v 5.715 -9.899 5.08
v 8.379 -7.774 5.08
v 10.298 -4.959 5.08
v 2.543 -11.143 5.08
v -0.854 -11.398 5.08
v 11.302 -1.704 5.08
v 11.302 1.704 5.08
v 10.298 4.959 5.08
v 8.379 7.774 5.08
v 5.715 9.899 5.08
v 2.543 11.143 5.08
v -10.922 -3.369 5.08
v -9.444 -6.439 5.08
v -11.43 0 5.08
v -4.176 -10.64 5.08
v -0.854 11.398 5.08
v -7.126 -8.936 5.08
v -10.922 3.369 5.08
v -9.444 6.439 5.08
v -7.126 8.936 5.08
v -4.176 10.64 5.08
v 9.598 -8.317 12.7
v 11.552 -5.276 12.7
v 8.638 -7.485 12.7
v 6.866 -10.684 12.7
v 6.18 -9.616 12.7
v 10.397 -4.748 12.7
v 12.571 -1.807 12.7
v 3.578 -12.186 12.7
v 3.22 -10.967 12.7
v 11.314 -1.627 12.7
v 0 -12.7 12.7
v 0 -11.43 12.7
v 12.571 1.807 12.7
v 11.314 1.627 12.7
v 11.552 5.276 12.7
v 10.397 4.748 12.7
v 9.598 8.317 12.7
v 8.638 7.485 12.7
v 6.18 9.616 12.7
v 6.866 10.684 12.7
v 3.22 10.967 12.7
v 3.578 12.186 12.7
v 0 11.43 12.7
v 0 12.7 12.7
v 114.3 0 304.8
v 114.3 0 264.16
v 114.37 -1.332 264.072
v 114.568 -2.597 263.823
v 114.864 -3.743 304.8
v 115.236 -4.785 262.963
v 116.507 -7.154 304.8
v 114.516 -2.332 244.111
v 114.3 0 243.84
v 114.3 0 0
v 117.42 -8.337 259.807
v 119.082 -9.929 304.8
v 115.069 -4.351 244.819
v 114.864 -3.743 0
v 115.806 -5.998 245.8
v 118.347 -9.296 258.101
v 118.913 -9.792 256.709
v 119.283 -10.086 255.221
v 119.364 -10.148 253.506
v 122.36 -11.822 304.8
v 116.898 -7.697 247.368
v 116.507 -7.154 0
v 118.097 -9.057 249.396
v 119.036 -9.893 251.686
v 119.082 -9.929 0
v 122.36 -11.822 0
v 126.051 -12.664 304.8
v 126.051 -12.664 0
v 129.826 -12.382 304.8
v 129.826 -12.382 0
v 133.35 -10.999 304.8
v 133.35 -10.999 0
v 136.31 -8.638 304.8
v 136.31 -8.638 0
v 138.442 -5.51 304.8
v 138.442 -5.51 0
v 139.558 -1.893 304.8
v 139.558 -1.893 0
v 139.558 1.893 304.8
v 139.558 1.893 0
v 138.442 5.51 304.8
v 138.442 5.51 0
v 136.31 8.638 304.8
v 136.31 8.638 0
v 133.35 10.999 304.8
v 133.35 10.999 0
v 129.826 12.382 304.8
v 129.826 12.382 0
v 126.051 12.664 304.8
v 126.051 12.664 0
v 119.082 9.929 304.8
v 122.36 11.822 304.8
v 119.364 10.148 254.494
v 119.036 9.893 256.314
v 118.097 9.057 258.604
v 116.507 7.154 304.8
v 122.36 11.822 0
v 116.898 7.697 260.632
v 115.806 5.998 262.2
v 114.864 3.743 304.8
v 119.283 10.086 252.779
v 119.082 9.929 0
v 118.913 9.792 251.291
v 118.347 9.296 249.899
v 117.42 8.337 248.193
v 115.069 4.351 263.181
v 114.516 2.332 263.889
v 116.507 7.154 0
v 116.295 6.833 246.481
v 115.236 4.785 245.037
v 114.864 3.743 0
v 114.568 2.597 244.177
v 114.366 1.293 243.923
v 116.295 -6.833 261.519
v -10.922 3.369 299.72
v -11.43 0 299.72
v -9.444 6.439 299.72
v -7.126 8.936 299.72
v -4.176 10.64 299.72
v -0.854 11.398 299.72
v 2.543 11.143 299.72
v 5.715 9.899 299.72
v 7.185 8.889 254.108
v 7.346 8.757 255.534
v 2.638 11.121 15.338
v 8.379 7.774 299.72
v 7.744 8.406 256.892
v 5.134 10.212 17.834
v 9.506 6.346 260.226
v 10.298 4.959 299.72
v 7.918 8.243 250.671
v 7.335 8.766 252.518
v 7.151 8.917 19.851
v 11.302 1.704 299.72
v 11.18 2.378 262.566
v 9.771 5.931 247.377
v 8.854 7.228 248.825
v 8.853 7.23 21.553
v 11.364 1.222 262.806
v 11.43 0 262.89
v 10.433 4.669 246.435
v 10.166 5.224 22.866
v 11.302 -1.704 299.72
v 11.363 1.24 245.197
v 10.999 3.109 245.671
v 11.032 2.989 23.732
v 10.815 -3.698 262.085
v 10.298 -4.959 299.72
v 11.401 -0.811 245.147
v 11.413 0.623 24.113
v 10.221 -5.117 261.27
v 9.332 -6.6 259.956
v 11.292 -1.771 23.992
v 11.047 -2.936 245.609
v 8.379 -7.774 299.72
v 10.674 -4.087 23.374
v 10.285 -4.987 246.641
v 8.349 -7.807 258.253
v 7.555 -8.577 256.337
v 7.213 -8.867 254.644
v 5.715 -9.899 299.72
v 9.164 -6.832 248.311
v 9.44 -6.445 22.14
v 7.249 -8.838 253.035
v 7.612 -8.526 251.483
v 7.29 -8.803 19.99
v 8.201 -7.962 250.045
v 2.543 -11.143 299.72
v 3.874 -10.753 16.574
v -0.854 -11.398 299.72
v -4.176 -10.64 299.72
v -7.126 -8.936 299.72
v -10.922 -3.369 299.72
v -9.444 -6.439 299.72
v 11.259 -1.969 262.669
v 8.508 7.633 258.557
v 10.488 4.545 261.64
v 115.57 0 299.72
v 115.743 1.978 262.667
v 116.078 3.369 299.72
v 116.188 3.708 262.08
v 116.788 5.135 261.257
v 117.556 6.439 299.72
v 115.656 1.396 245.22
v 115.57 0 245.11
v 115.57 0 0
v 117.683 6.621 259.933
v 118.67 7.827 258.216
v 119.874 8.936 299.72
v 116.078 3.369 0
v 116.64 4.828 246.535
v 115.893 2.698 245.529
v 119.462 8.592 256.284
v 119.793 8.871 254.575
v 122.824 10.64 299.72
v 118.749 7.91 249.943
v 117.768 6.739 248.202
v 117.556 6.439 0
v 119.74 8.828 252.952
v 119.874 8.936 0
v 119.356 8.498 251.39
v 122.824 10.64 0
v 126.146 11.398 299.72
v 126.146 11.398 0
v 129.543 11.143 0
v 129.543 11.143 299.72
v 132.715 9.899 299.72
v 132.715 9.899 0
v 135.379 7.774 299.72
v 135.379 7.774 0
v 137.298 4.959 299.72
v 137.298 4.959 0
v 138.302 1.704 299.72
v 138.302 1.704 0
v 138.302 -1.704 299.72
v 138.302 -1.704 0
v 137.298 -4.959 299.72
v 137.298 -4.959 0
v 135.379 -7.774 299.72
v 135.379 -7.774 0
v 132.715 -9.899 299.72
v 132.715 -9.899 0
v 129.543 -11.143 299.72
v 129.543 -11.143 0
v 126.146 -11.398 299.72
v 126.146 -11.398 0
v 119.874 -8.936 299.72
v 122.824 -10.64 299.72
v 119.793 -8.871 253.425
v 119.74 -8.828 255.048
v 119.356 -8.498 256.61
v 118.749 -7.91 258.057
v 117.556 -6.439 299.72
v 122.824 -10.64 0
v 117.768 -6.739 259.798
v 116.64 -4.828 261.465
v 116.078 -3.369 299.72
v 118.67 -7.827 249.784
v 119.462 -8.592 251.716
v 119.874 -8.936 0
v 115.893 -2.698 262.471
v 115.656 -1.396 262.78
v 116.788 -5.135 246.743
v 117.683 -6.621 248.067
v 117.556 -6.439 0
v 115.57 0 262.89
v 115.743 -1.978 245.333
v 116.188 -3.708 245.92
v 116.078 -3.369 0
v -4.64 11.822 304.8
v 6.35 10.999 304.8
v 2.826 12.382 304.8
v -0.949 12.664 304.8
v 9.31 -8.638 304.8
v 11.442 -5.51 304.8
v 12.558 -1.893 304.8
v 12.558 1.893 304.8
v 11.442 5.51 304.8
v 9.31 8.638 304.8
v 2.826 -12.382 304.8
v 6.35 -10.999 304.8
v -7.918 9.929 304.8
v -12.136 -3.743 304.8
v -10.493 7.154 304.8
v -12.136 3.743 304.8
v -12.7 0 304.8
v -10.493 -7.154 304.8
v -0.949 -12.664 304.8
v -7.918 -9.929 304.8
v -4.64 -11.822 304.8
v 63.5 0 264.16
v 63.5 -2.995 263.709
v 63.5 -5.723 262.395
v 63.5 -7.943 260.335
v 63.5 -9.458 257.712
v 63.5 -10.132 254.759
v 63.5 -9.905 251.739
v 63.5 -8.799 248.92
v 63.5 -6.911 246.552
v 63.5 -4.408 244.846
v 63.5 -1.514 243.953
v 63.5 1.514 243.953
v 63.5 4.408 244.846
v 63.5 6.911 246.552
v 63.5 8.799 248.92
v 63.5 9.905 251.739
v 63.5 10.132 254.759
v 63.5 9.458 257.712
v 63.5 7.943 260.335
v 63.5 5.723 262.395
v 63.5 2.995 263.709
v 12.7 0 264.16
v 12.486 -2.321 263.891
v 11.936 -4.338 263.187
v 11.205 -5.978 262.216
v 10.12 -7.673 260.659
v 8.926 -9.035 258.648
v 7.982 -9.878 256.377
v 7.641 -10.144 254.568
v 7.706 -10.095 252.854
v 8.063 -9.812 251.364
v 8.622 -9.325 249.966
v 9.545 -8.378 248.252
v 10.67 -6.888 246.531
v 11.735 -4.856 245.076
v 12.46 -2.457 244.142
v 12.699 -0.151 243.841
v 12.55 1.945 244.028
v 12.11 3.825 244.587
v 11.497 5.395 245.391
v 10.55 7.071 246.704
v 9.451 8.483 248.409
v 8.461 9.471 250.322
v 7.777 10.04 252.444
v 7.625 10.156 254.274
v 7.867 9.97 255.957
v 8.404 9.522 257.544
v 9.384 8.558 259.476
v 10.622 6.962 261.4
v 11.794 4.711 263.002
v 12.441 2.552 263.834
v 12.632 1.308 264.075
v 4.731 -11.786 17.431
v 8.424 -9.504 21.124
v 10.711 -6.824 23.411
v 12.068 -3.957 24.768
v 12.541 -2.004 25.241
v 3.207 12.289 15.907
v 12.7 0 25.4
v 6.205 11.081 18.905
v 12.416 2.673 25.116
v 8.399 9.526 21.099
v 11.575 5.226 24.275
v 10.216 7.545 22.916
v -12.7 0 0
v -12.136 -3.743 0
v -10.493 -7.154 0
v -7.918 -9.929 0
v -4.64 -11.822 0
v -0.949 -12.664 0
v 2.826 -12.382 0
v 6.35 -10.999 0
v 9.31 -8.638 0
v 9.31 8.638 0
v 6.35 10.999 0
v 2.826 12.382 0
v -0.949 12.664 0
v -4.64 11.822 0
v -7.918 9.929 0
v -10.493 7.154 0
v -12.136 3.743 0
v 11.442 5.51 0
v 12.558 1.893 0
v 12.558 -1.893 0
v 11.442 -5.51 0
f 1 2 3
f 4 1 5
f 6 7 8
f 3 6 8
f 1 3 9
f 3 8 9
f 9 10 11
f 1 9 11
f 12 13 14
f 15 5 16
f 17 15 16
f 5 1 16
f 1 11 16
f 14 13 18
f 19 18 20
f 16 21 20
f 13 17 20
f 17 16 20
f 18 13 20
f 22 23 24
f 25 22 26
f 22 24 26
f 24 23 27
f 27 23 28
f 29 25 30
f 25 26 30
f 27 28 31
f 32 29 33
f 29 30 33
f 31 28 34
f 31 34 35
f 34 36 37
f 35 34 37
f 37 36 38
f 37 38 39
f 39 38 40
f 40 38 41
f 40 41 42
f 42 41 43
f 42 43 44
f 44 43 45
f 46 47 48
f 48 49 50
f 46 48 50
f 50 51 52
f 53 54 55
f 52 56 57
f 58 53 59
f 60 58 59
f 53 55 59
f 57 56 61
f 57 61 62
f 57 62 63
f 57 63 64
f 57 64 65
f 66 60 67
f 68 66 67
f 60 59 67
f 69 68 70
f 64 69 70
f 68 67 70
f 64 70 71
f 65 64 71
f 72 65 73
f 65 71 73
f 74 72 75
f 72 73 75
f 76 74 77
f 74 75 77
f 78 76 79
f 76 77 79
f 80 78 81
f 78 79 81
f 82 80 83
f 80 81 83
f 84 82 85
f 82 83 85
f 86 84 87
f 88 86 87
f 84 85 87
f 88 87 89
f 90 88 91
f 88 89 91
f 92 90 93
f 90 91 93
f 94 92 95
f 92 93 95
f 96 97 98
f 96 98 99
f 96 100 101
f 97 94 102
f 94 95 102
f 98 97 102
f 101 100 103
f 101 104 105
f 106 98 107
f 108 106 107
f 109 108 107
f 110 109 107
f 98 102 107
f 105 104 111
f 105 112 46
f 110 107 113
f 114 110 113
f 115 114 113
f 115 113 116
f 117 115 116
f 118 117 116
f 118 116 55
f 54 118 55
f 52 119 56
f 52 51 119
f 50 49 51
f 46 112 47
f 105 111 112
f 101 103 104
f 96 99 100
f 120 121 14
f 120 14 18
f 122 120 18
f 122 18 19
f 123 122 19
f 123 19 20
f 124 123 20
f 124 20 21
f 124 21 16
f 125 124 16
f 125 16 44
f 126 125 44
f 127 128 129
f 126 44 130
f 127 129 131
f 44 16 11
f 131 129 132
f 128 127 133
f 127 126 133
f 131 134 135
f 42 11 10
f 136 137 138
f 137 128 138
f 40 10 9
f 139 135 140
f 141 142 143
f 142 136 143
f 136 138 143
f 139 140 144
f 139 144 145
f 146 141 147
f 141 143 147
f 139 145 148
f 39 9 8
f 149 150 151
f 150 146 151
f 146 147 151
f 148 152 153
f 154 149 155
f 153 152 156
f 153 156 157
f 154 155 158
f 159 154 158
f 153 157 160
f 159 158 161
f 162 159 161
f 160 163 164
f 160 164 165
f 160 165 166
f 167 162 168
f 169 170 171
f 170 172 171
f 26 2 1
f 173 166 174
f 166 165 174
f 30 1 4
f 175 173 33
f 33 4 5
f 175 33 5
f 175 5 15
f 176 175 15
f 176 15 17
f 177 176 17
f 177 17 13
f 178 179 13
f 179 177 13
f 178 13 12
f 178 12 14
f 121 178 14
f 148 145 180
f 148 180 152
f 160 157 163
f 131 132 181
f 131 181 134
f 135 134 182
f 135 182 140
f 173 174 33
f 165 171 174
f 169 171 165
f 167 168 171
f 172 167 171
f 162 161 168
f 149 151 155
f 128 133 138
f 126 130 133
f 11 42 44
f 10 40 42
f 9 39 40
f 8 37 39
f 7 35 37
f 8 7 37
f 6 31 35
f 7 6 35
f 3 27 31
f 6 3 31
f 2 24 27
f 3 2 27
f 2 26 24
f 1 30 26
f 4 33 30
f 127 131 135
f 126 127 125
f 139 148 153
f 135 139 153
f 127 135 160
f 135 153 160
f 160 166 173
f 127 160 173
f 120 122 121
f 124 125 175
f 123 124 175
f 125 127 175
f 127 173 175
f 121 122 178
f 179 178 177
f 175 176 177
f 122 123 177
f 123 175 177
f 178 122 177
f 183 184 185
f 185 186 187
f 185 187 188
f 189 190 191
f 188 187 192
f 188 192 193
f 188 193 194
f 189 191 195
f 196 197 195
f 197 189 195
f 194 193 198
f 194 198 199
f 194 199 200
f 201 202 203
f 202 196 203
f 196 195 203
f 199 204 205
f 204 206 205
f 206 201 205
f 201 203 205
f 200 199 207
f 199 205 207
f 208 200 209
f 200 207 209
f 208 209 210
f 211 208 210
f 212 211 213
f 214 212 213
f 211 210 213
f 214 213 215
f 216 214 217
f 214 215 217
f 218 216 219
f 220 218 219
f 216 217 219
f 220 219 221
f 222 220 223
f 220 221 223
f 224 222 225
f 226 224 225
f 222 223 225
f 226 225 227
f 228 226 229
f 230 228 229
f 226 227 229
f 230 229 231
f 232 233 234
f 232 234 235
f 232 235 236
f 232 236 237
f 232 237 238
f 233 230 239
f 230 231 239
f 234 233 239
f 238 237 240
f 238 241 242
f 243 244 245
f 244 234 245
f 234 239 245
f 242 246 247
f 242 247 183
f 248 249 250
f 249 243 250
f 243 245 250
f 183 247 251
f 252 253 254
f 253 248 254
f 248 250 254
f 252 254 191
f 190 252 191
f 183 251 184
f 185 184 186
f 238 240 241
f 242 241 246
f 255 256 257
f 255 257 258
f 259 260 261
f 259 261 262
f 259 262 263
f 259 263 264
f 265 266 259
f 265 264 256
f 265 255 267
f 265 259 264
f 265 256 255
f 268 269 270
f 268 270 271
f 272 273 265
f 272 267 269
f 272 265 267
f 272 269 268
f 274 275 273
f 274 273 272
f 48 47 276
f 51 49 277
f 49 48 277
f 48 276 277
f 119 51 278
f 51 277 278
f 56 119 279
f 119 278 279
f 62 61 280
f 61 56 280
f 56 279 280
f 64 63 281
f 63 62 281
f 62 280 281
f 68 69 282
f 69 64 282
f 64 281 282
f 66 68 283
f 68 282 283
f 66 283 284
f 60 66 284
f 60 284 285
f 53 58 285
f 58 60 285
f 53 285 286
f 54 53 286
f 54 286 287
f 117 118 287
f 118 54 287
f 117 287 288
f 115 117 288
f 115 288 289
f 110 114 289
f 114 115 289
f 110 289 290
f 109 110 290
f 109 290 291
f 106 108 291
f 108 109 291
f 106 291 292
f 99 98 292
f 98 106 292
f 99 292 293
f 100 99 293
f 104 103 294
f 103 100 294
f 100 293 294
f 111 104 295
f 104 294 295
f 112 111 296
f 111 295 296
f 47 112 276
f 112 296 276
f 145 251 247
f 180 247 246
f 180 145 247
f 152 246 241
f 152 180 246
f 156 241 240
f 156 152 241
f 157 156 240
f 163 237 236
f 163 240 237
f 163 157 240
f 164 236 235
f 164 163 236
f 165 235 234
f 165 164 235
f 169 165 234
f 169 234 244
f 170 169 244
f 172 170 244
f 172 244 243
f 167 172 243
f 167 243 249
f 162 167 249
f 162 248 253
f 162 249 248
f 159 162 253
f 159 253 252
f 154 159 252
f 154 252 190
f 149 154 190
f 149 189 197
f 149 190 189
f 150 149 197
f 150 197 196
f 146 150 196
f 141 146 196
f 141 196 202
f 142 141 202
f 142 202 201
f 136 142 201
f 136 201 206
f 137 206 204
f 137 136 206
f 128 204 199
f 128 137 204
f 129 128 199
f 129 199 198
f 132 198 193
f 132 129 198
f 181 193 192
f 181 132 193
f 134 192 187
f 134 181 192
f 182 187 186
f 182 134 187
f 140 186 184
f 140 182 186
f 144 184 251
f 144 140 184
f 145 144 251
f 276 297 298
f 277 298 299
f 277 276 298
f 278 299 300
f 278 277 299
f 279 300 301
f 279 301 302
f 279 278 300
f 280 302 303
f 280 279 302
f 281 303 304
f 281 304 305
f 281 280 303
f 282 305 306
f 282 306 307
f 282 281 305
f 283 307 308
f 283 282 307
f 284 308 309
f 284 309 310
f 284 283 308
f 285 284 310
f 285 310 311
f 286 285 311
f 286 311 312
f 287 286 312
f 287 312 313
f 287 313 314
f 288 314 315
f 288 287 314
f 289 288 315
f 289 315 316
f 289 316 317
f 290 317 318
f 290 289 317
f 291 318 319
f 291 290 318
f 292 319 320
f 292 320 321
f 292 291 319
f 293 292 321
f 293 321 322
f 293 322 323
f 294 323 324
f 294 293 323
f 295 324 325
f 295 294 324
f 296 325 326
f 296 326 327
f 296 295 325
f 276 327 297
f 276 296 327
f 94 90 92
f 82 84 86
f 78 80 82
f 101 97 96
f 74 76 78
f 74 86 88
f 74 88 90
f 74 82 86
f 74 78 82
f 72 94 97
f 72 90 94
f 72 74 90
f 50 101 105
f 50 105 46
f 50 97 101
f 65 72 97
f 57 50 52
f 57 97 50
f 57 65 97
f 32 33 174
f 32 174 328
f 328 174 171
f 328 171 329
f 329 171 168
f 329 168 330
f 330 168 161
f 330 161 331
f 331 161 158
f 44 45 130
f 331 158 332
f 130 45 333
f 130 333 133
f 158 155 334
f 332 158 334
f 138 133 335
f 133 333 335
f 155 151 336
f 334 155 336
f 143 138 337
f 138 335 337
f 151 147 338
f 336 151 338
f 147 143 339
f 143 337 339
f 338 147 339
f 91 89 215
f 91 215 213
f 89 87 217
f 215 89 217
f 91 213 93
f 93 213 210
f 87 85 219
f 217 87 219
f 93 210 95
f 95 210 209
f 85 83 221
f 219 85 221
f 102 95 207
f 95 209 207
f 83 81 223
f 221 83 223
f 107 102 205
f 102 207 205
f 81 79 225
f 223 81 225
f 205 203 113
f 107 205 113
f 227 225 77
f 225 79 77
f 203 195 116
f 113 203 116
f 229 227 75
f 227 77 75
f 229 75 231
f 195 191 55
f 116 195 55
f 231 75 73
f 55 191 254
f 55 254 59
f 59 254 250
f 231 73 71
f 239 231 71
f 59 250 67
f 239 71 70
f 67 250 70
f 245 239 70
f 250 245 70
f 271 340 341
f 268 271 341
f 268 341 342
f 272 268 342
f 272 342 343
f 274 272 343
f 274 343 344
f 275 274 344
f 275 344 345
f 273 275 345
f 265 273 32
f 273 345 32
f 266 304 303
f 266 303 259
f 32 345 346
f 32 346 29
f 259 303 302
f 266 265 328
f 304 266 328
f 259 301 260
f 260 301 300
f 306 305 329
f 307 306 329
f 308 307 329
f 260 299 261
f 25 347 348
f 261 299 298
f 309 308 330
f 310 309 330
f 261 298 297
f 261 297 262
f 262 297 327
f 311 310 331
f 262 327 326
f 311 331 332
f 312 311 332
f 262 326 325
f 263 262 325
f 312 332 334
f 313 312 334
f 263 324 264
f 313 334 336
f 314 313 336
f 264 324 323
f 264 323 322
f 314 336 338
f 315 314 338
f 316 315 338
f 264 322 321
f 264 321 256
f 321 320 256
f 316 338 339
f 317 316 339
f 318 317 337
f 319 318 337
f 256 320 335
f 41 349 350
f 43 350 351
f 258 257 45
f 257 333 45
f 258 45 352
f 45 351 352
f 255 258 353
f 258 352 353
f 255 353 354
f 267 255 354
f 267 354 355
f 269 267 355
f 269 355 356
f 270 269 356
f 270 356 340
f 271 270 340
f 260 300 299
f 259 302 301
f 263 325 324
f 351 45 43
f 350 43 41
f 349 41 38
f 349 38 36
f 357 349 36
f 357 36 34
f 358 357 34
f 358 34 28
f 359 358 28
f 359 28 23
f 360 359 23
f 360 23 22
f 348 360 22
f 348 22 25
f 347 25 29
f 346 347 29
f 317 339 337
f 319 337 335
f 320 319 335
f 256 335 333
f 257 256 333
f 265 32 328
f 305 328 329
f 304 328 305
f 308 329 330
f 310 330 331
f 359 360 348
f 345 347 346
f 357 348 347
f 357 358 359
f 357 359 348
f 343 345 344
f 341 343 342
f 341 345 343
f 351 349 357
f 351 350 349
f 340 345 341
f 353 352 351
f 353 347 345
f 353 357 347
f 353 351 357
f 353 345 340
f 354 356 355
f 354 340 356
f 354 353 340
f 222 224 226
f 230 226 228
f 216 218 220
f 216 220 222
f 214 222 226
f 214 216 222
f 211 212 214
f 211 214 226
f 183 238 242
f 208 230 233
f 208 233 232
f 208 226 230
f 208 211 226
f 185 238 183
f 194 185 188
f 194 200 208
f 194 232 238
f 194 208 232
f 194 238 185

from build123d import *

# Parameters (mm, degrees)
SKETCH1_R                            = 12.7
BOSS_EXTRUDE2_DEPTH                  = 304.8
BOSS_EXTRUDE2_2_DEPTH                = 304.8
SKETCH10_R                           = 11.43
CUT_EXTRUDE1_DEPTH                   = 304.8
SKETCH11_R                           = 11.43
BOSS_EXTRUDE3_DEPTH                  = 5.08
SKETCH12_R                           = 11.43
BOSS_EXTRUDE4_DEPTH                  = 5.08
CUT_EXTRUDE2_DEPTH                   = 13.97
SKETCH14_R                           = 11.43
CUT_EXTRUDE3_DEPTH                   = 299.72
BOSS_EXTRUDE5_REACH                  = 316.437
BOSS_EXTRUDE5_END_RADIUS             = 12.7
SKETCH15_R                           = 10.16
BOSS_EXTRUDE5_DIRECTION_2_REACH      = 316.437
BOSS_EXTRUDE5_DIRECTION_2_END_RADIUS = 12.7
CUT_EXTRUDE4_REACH                   = 337.53
CUT_EXTRUDE4_END_RADIUS              = 11.43
SKETCH17_R                           = 8.89


with BuildPart() as part:
    # Sketch1 → Boss-Extrude2 (new body)
    with BuildSketch(Plane.XY):
        with Locations(Location((0, 0, 0), (0, 0, 180))):
            Circle(SKETCH1_R)
    extrude(amount=BOSS_EXTRUDE2_DEPTH)

    # Sketch10 → Cut-Extrude1 (cut)
    with BuildSketch(Plane(origin=(0, 0, 0), x_dir=(-1, 0, 0), z_dir=(0, 0, -1))):
        Circle(SKETCH10_R)
    extrude(amount=-CUT_EXTRUDE1_DEPTH, mode=Mode.SUBTRACT)

    # Sketch11 → Boss-Extrude3 (add)
    with BuildSketch(Plane(origin=(0, 0, 0), x_dir=(-1, 0, 0), z_dir=(0, 0, -1))):
        Circle(SKETCH11_R)
    extrude(amount=-BOSS_EXTRUDE3_DEPTH)

    # Sketch12 → Boss-Extrude4 (add)
    with BuildSketch(Plane.XY.offset(304.8)):
        with Locations(Location((0, 0, 0), (0, 0, 180))):
            Circle(SKETCH12_R)
    extrude(amount=-BOSS_EXTRUDE4_DEPTH)

    # Sketch3 → Cut-Extrude2 (cut, symmetric)
    with BuildSketch(Plane(origin=(0, 0, 0), x_dir=(1, 0, 0), z_dir=(0, 1, 0))):
        Polygon((12.7, -12.7), (0, -12.7), (12.7, -25.4), align=None)
    extrude(amount=CUT_EXTRUDE2_DEPTH, both=True, mode=Mode.SUBTRACT)



with BuildPart() as body_2:
    # Sketch1 → Boss-Extrude2 2 (new body)
    with BuildSketch(Plane.XY):
        with Locations(Location((127, 0, 0), (0, 0, 180))):
            Circle(SKETCH1_R)
    extrude(amount=BOSS_EXTRUDE2_2_DEPTH)

    # Sketch14 → Cut-Extrude3 (cut)
    with BuildSketch(Plane(origin=(0, 0, 0), x_dir=(-1, 0, 0), z_dir=(0, 0, -1))):
        with Locations((-127, 0)):
            Circle(SKETCH14_R)
    extrude(amount=-CUT_EXTRUDE3_DEPTH, mode=Mode.SUBTRACT)


with BuildPart() as part_1:
    add(part.part)

    add(body_2.part)  # Boss-Extrude5 merges body 2
    # Boss-Extrude5: up to this cylinder (the profile starts outside it)
    boss_extrude5_end = Plane(origin=(127, 0, 254), z_dir=(0, 0, -1)) * Cylinder(BOSS_EXTRUDE5_END_RADIUS, 659.274, mode=Mode.PRIVATE)
    # Sketch15 → Boss-Extrude5 (add, up to the surface)
    with BuildSketch(Plane(origin=(63.5, 0, 0), x_dir=(0, 0, -1), z_dir=(1, 0, 0)), mode=Mode.PRIVATE) as boss_extrude5_sk1:
        with Locations(Location((-254, 0, 0), (0, 0, 180))):
            Circle(SKETCH15_R)
    boss_extrude5_tool1 = extrude(boss_extrude5_sk1.sketch, amount=BOSS_EXTRUDE5_REACH, mode=Mode.PRIVATE) - boss_extrude5_end
    add(boss_extrude5_tool1.solids().sort_by_distance((63.5, 0, 254))[0])

    # Boss-Extrude5 direction 2: up to this cylinder (the profile starts outside it)
    boss_extrude5_direction_2_end = Plane(origin=(0, 0, 254), z_dir=(0, 0, -1)) * Cylinder(BOSS_EXTRUDE5_DIRECTION_2_END_RADIUS, 659.274, mode=Mode.PRIVATE)
    # Sketch15 → Boss-Extrude5 direction 2 (add, up to the surface)
    with BuildSketch(Plane(origin=(63.5, 0, 0), x_dir=(0, 0, -1), z_dir=(1, 0, 0)), mode=Mode.PRIVATE) as boss_extrude5_direction_2_sk1:
        with Locations(Location((-254, 0, 0), (0, 0, 180))):
            Circle(SKETCH15_R)
    boss_extrude5_direction_2_tool1 = extrude(boss_extrude5_direction_2_sk1.sketch, amount=-BOSS_EXTRUDE5_DIRECTION_2_REACH, mode=Mode.PRIVATE) - boss_extrude5_direction_2_end
    add(boss_extrude5_direction_2_tool1.solids().sort_by_distance((63.5, 0, 254))[0])

    # Cut-Extrude4: up to this cylinder (the profile starts outside it)
    cut_extrude4_end = Plane(origin=(127, 0, 254), z_dir=(0, 0, -1)) * Cylinder(CUT_EXTRUDE4_END_RADIUS, 698.92, mode=Mode.PRIVATE)
    # Sketch17 → Cut-Extrude4 (cut, up to the surface)
    with BuildSketch(Plane(origin=(0, 0, 0), x_dir=(0, 0, -1), z_dir=(1, 0, 0)), mode=Mode.PRIVATE) as cut_extrude4_sk1:
        with Locations(Location((-254, 0, 0), (0, 0, 180))):
            Circle(SKETCH17_R)
    cut_extrude4_tool1 = extrude(cut_extrude4_sk1.sketch, amount=CUT_EXTRUDE4_REACH, mode=Mode.PRIVATE) - cut_extrude4_end
    add(cut_extrude4_tool1.solids().sort_by_distance((0, 0, 254))[0], mode=Mode.SUBTRACT)


solid = part_1.part
